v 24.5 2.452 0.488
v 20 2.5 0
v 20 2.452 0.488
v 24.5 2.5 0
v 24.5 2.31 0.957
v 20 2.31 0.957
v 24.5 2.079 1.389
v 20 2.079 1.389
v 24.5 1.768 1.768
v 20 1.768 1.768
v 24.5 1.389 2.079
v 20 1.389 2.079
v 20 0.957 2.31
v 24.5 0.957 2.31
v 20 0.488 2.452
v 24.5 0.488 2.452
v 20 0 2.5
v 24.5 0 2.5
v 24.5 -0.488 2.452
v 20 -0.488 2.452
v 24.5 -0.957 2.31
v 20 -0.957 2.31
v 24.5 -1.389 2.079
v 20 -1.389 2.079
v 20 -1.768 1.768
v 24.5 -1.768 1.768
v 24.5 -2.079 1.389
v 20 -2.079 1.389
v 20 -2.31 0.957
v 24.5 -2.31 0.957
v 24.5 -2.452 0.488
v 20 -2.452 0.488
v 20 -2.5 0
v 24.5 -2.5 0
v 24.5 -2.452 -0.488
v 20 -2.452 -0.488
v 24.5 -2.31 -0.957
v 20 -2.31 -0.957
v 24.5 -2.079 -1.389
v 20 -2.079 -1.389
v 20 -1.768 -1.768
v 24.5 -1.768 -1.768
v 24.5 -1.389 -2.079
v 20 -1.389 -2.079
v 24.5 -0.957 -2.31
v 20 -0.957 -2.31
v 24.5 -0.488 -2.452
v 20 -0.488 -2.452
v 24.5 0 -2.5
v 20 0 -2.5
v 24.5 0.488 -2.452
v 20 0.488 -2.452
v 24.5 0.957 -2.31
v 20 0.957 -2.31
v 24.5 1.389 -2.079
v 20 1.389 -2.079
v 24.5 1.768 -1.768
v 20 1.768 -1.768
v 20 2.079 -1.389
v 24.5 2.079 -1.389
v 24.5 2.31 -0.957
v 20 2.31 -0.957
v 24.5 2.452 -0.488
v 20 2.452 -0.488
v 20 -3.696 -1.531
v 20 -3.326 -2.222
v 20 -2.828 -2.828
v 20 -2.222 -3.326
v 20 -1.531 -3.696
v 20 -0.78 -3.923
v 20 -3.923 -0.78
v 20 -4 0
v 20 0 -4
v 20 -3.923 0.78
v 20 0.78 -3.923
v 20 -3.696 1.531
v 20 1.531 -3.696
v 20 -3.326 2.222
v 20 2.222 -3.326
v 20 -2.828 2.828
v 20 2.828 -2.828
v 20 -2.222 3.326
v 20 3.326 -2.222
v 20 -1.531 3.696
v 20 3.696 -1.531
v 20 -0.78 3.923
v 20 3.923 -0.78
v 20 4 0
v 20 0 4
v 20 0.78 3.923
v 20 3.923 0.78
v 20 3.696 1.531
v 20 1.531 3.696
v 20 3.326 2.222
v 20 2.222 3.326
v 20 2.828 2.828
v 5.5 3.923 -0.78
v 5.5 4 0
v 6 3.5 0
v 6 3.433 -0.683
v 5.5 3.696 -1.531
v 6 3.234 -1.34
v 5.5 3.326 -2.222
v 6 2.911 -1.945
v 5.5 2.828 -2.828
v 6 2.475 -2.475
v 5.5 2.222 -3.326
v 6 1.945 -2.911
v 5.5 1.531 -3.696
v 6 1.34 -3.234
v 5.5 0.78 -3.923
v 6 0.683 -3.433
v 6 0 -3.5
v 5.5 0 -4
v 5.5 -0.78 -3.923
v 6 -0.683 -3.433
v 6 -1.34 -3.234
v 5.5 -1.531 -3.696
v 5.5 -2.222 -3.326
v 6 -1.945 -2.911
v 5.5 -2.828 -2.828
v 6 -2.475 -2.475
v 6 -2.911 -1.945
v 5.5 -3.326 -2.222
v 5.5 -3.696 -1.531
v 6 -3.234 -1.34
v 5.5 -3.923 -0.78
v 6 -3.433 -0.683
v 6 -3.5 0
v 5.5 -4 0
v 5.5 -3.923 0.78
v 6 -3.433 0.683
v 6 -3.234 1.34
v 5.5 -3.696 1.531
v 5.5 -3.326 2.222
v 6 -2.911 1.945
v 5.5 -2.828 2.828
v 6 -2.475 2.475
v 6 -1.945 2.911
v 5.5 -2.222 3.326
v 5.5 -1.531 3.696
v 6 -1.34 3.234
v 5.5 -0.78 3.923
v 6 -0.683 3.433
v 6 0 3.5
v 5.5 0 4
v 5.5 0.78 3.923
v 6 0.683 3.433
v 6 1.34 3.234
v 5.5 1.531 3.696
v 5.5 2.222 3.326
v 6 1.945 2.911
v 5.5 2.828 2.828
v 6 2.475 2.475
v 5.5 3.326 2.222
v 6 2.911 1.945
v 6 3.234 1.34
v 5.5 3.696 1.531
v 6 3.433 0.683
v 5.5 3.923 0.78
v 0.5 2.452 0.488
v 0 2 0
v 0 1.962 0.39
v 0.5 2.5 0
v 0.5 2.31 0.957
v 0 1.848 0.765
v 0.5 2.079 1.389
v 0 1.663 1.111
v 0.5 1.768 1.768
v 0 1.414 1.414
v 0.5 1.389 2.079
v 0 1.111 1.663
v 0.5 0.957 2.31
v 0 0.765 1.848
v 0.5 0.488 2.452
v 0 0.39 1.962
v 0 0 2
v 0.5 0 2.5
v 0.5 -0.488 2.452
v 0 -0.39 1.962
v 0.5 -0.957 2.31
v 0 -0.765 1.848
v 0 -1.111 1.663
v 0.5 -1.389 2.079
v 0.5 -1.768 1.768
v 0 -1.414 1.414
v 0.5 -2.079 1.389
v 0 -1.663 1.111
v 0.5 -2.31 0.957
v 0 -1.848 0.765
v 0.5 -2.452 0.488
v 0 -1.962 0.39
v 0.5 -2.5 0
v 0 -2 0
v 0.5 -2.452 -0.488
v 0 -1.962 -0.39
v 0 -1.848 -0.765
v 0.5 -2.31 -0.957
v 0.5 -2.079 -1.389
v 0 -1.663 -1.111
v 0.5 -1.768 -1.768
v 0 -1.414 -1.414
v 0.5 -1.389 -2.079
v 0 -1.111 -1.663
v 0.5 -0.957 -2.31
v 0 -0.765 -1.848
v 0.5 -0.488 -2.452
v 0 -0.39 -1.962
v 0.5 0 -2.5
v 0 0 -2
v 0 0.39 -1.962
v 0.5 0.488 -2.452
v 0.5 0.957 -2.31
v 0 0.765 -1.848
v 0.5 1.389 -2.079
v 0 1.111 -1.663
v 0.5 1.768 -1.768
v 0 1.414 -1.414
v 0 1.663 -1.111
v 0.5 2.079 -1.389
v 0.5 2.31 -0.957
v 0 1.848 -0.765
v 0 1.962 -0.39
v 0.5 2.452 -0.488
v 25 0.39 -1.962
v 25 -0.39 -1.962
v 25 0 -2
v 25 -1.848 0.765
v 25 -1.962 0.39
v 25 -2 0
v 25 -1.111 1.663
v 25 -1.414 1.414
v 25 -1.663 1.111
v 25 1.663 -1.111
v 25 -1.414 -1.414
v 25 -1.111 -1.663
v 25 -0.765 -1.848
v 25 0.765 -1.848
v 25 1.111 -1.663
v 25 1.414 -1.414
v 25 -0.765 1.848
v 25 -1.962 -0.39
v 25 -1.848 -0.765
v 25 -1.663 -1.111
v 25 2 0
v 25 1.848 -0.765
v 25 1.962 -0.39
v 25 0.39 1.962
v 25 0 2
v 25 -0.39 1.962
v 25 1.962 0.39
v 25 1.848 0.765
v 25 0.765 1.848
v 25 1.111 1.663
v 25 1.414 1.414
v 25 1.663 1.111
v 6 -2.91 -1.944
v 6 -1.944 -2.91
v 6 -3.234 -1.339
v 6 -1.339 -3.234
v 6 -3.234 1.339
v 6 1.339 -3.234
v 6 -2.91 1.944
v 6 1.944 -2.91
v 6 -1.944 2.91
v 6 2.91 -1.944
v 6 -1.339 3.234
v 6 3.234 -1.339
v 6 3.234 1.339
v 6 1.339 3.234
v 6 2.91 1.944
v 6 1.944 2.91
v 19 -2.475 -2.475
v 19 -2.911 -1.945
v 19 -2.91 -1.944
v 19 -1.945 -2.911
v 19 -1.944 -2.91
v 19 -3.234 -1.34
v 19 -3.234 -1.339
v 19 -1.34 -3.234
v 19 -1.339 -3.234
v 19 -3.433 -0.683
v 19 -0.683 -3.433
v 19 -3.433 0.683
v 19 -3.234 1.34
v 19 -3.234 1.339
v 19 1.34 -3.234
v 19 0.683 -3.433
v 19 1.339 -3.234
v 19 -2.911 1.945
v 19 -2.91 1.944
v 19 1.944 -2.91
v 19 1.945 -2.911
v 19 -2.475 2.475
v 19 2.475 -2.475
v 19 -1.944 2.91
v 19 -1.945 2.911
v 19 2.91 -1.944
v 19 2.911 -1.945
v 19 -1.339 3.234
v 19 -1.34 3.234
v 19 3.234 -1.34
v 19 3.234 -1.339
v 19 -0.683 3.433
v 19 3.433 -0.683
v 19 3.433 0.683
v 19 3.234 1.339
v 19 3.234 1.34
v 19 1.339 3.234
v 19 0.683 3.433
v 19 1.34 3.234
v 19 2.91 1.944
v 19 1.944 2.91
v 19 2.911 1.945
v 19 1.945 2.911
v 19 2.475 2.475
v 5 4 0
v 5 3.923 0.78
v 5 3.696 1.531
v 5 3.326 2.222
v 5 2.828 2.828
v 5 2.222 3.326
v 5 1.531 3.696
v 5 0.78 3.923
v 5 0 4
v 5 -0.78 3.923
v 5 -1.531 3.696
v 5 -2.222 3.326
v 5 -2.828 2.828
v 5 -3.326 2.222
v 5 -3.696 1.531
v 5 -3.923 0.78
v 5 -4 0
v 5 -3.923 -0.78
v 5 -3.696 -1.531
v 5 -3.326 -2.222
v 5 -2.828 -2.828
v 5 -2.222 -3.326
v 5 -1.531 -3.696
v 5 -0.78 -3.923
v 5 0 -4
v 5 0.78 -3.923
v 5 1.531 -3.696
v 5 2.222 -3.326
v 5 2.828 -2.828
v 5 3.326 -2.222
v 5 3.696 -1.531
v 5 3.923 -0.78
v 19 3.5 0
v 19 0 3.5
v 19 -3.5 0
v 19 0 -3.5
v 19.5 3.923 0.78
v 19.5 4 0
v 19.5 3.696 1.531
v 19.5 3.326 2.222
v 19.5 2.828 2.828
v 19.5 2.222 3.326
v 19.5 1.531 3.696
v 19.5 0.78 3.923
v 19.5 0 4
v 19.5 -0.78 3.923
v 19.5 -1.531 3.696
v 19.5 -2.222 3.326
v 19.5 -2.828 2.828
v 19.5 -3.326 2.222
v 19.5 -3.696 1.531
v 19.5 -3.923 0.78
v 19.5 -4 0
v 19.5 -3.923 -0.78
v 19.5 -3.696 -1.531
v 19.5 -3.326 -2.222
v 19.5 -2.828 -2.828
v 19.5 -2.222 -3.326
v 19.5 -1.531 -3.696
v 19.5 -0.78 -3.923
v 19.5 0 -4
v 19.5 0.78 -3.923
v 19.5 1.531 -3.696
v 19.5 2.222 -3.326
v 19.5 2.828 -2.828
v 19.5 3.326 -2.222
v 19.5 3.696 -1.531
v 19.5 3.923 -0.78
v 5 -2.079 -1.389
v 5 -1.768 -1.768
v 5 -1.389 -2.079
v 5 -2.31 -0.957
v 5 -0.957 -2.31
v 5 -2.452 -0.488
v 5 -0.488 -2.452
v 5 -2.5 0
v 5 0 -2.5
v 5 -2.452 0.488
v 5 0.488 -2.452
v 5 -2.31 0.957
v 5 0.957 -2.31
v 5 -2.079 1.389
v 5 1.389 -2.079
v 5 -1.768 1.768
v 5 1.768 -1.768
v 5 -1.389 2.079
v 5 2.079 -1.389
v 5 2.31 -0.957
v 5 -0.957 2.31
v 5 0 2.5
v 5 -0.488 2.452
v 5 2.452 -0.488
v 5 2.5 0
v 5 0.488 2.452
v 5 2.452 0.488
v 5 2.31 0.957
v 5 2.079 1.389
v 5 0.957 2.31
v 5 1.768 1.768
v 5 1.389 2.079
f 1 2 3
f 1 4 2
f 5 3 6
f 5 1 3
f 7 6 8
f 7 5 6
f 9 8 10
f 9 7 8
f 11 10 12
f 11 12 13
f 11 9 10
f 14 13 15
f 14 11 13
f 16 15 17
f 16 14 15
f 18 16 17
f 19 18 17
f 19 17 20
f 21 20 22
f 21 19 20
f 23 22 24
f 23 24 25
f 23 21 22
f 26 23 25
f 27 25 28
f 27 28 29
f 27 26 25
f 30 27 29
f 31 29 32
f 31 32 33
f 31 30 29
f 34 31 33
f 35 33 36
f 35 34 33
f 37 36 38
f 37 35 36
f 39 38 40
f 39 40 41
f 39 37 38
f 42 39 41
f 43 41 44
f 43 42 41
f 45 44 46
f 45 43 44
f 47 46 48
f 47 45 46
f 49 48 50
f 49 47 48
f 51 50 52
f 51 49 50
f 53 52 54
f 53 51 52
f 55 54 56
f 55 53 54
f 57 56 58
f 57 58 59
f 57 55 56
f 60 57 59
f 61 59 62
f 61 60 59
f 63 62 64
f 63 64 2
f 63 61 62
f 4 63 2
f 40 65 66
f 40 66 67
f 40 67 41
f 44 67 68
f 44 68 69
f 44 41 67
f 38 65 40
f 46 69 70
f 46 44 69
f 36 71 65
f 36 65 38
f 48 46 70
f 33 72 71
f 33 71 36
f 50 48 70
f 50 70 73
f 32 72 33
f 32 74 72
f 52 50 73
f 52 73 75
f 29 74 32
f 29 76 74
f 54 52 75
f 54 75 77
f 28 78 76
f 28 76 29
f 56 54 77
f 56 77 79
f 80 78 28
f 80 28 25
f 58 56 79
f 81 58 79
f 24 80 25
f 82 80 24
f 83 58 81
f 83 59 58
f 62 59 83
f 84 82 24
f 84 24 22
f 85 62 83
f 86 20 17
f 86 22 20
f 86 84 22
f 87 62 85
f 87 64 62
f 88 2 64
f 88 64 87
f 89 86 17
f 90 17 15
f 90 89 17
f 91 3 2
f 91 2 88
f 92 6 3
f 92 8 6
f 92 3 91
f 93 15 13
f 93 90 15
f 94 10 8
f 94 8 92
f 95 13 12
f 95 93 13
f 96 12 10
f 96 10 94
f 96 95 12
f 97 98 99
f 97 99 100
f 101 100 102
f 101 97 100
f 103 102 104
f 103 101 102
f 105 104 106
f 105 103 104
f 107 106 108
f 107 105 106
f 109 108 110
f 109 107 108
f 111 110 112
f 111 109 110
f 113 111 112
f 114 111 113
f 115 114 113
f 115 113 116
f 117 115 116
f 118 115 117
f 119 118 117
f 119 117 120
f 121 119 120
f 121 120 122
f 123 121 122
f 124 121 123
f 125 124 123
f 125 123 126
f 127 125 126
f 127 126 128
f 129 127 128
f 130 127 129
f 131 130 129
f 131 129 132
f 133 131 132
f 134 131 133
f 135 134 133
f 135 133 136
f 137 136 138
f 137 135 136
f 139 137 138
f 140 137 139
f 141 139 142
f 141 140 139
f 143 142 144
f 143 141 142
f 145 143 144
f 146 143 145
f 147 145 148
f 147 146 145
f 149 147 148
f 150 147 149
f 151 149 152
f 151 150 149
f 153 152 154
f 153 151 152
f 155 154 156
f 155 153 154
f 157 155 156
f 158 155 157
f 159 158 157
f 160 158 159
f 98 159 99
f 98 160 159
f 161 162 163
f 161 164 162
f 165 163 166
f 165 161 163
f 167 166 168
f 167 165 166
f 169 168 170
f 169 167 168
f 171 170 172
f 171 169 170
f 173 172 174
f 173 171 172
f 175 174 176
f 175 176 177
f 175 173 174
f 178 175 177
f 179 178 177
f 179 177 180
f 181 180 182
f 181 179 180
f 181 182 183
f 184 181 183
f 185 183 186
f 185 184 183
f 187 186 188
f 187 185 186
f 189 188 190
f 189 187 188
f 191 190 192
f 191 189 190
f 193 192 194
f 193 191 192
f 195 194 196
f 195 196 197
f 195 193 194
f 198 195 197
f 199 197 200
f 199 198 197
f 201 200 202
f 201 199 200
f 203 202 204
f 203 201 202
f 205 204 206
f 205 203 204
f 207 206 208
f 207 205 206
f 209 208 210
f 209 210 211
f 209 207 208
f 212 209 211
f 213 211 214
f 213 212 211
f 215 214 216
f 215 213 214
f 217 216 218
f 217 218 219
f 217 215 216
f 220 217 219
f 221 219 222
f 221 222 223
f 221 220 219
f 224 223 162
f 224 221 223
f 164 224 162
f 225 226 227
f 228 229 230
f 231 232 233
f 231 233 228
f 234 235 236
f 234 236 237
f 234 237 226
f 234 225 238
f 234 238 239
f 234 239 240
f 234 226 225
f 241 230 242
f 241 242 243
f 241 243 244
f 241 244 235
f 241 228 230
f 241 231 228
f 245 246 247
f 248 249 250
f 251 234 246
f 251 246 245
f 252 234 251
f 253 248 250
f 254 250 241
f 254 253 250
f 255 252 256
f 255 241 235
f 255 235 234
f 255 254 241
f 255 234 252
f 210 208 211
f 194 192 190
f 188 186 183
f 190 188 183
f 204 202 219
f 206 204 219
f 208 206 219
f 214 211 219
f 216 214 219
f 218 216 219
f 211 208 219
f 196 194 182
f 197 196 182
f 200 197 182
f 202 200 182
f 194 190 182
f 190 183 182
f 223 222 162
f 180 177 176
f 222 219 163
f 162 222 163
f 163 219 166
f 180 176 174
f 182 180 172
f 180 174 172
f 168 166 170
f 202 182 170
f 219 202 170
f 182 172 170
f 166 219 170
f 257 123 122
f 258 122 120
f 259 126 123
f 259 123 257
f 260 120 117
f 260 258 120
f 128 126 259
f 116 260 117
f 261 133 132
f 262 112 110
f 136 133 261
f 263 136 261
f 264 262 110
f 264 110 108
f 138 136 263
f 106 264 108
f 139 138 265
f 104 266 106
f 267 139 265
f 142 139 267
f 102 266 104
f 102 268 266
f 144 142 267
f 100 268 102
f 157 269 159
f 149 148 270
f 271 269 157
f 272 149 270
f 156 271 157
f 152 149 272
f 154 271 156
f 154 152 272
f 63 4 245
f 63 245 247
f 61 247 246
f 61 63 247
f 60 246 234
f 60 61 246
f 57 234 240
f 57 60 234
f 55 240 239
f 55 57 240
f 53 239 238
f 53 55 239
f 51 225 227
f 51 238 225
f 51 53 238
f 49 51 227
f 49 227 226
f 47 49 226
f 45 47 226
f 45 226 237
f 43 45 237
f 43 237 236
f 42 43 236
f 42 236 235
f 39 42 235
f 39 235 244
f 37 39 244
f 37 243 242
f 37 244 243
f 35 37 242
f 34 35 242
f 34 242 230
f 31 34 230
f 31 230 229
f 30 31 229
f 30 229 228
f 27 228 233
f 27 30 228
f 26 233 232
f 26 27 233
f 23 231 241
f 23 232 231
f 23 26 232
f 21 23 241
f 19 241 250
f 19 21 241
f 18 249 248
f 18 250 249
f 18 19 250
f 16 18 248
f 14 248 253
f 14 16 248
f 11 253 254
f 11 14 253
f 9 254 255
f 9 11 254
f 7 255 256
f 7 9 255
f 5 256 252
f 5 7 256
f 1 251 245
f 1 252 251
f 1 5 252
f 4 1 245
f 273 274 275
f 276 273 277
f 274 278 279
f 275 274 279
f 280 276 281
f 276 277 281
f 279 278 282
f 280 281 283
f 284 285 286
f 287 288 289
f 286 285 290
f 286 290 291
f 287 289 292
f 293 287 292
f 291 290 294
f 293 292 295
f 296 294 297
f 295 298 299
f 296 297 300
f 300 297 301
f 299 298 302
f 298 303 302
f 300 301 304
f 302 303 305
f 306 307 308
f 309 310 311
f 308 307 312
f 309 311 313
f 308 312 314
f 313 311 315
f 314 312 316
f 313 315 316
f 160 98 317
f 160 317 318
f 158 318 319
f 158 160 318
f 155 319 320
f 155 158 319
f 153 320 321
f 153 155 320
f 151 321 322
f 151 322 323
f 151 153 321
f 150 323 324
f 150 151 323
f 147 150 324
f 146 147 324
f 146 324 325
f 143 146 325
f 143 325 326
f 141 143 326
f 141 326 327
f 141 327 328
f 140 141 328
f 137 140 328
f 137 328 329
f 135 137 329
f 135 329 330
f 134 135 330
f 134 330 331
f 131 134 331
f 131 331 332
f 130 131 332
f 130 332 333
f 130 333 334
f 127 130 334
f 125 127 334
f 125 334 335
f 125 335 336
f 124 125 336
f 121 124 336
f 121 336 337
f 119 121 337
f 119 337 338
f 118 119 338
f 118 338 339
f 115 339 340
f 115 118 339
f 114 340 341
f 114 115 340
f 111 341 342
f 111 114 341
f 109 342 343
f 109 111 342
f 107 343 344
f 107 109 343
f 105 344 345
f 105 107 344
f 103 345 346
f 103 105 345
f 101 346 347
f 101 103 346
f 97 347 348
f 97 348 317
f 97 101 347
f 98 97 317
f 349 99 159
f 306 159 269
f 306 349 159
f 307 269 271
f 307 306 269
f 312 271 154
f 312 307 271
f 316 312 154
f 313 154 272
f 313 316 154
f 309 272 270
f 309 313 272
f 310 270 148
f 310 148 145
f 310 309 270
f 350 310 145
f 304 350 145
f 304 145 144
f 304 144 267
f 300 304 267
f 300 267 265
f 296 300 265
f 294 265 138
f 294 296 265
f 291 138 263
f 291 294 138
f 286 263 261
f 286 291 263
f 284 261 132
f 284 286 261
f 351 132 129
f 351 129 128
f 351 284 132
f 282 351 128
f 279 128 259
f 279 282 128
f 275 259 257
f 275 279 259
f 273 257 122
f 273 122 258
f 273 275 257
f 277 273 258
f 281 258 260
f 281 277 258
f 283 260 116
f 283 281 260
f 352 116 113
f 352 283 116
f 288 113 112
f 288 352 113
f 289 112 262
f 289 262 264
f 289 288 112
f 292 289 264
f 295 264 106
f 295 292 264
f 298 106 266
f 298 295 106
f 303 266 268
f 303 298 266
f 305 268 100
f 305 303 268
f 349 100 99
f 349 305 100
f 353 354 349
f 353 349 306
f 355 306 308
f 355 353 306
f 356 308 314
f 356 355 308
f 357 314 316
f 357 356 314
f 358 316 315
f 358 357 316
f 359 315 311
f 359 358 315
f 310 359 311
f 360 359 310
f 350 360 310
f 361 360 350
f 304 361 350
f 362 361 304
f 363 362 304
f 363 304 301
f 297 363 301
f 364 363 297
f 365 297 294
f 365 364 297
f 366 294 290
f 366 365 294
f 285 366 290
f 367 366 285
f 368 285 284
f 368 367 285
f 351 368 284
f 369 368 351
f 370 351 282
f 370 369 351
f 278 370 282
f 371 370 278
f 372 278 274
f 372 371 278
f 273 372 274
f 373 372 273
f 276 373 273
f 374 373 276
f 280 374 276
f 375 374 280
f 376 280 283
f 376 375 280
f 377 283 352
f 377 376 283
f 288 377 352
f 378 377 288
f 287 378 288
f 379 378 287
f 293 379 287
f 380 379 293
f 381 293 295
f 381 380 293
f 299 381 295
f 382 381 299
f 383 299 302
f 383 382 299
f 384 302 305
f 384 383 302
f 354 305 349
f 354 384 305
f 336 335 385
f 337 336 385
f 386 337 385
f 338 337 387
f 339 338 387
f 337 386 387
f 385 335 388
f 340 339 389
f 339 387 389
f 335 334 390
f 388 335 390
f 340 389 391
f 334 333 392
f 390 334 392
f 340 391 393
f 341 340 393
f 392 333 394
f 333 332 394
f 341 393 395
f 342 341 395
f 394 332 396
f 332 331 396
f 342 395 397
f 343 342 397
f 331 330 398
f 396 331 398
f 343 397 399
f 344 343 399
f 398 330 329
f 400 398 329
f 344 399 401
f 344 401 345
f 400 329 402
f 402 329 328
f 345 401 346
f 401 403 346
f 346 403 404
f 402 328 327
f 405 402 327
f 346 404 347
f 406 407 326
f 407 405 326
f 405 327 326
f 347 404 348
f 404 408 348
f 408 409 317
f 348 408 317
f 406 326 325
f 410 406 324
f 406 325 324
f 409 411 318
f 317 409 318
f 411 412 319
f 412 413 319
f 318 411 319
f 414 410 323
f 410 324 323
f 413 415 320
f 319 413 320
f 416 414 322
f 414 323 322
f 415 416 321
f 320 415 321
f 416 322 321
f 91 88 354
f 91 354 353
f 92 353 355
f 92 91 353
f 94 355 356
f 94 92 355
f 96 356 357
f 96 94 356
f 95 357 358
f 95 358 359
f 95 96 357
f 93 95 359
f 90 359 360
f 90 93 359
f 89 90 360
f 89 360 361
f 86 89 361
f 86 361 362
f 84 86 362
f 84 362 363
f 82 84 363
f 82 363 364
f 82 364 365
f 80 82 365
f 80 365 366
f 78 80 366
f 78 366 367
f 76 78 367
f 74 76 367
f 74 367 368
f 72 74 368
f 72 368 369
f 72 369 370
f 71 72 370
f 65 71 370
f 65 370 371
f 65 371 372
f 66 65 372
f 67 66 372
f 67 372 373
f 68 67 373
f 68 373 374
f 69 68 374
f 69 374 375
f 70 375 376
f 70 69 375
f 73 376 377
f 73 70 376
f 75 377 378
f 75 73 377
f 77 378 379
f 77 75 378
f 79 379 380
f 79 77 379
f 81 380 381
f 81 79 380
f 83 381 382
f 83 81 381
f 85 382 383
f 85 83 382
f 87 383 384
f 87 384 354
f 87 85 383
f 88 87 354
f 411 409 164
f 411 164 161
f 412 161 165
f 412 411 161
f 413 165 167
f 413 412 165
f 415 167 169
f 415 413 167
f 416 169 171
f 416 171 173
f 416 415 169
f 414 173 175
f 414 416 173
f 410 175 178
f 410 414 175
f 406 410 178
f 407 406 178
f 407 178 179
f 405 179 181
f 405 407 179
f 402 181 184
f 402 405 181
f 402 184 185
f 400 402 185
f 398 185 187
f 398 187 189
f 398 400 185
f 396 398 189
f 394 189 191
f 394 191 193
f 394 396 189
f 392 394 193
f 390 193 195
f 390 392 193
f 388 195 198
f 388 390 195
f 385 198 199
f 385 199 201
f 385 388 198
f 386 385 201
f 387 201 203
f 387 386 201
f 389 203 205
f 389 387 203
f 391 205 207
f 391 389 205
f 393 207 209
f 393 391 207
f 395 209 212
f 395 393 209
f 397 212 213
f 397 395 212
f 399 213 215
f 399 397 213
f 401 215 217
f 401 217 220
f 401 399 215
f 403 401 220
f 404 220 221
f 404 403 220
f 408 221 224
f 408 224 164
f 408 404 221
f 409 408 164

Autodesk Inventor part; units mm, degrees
ref_plane "Startebene" through (0, 0, 0) normal (1, 0, 0) x (0, 1, 0)
ref_plane "XZ Plane" through (0, 0, 0) normal (0, 1, 0) x (-1, 0, 0)
ref_plane "XY Plane" through (0, 0, 0) normal (0, 0, 1) x (1, 0, 0)
sketch "Hauptskizze" plane through (0, 0, 0) normal (0, 0, 1) x (1, 0, 0)
  line L0 (0, 0) -> (25, 0)
  line L1 (0, 0) -> (0, 2.5)
  line L2 (0, 2.5) -> (5, 2.5)
  line L3 (5, 2.5) -> (5, 4)
  line L4 (6, 4) -> (6, 3.5)
  line L5 (5, 4) -> (6, 4)
  line L6 (6, 3.5) -> (19, 3.5)
  line L7 (20, 4) -> (20, 2.5)
  line L8 (19, 4) -> (20, 4)
  line L9 (25, 2.5) -> (25, 0)
  line L10 (20, 2.5) -> (25, 2.5)
  line L11 (19, 3.5) -> (19, 4)
  dimension "d3" = 5
  dimension "d4" = 8
  dimension "d5" = 7
  dimension "d13" = 8
  dimension "d14" = 5
revolve "Umdrehung1" add sketch "Hauptskizze" angle 360 about axis through (0, 0, 0) along (1, 0, 0)
chamfer "Fase5" distance 0.5 angle 45 1 edges at (19, -4, 0) measured on face at (19.3333, 3.987, -0.3219)
chamfer "Fase4" distance 0.5 angle 45 1 edges at (6, -4, 0) measured on face at (5.3333, 3.987, -0.3219)
chamfer "Fase3" distance 0.5 angle 45 1 edges at (25, -2.5, 0) measured on face at (21.6667, 2.4676, -0.401)
chamfer "Fase1" distance 0.5 angle 45 1 edges at (0, -2.5, 0) measured on face at (1.6667, 2.4676, -0.401)
properties part number "Welle 5x4+6x15+5x4" material "Messing, weicher Gelbton"
